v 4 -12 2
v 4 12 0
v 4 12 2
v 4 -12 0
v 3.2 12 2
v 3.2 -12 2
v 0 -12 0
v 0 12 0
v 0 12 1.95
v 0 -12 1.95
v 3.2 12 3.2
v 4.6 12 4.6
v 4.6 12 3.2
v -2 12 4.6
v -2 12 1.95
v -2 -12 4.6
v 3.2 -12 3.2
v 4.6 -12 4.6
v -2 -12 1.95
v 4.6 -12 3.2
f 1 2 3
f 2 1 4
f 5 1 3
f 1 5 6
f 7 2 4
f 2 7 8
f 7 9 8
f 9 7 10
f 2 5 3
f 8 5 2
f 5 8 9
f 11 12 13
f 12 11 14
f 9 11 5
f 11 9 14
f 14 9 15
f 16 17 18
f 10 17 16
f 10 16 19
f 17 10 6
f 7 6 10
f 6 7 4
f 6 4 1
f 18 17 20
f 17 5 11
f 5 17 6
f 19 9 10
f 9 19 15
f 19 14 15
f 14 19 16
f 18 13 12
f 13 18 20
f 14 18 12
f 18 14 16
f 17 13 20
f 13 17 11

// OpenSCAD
// ********************************
// Rover Body using Chip Trays
// Filename: ChipTrayRoverBody.scad
// Created: 8/7/2018
// Revision: 1.0.0 8/7/2018
// units: mm
// ********************************

$fn=90;
Overlap=0.05;
IDXtra=0.2;

module ChipTrayEdge(){
	CTLock_y=24;
	CTLock_e=4;
	CTLockInner_x=6.6;
	translate([0,-CTLock_y/2,0]){
	cube([CTLock_e,CTLock_y,2]);
	translate([-2,0,2-Overlap]) cube([CTLockInner_x-1.4,CTLock_y,1.4]);
	translate([-2,0,3.2]) cube([CTLockInner_x,CTLock_y,1.4]);
	}
} // ChipTrayEdge

ChipTrayEdge();

ChipTray_x=136;
ChipTray_y=315;

module ChipTray(){
	difference(){
		union(){
			cube([ChipTray_x,ChipTray_y,6.3],center=true);
			translate([0,0,0.6+Overlap]) cube([ChipTray_x-4,ChipTray_y-4,7.65],center=true);
		} // union
		
		translate([0,0,-7.65/2+1.2-Overlap]) cube([ChipTray_x-4,ChipTray_y-4,1.2+Overlap],center=true);
	} // diff
} // ChipTray 

nSides=4;

//for (J=[0:nSides-1]) rotate([0,360/nSides*J+180,0]) translate([0,0,-ChipTray_x/2-10])
//	ChipTray();


module ViewBody(){
	
} // ViewBody

//ViewBody();
